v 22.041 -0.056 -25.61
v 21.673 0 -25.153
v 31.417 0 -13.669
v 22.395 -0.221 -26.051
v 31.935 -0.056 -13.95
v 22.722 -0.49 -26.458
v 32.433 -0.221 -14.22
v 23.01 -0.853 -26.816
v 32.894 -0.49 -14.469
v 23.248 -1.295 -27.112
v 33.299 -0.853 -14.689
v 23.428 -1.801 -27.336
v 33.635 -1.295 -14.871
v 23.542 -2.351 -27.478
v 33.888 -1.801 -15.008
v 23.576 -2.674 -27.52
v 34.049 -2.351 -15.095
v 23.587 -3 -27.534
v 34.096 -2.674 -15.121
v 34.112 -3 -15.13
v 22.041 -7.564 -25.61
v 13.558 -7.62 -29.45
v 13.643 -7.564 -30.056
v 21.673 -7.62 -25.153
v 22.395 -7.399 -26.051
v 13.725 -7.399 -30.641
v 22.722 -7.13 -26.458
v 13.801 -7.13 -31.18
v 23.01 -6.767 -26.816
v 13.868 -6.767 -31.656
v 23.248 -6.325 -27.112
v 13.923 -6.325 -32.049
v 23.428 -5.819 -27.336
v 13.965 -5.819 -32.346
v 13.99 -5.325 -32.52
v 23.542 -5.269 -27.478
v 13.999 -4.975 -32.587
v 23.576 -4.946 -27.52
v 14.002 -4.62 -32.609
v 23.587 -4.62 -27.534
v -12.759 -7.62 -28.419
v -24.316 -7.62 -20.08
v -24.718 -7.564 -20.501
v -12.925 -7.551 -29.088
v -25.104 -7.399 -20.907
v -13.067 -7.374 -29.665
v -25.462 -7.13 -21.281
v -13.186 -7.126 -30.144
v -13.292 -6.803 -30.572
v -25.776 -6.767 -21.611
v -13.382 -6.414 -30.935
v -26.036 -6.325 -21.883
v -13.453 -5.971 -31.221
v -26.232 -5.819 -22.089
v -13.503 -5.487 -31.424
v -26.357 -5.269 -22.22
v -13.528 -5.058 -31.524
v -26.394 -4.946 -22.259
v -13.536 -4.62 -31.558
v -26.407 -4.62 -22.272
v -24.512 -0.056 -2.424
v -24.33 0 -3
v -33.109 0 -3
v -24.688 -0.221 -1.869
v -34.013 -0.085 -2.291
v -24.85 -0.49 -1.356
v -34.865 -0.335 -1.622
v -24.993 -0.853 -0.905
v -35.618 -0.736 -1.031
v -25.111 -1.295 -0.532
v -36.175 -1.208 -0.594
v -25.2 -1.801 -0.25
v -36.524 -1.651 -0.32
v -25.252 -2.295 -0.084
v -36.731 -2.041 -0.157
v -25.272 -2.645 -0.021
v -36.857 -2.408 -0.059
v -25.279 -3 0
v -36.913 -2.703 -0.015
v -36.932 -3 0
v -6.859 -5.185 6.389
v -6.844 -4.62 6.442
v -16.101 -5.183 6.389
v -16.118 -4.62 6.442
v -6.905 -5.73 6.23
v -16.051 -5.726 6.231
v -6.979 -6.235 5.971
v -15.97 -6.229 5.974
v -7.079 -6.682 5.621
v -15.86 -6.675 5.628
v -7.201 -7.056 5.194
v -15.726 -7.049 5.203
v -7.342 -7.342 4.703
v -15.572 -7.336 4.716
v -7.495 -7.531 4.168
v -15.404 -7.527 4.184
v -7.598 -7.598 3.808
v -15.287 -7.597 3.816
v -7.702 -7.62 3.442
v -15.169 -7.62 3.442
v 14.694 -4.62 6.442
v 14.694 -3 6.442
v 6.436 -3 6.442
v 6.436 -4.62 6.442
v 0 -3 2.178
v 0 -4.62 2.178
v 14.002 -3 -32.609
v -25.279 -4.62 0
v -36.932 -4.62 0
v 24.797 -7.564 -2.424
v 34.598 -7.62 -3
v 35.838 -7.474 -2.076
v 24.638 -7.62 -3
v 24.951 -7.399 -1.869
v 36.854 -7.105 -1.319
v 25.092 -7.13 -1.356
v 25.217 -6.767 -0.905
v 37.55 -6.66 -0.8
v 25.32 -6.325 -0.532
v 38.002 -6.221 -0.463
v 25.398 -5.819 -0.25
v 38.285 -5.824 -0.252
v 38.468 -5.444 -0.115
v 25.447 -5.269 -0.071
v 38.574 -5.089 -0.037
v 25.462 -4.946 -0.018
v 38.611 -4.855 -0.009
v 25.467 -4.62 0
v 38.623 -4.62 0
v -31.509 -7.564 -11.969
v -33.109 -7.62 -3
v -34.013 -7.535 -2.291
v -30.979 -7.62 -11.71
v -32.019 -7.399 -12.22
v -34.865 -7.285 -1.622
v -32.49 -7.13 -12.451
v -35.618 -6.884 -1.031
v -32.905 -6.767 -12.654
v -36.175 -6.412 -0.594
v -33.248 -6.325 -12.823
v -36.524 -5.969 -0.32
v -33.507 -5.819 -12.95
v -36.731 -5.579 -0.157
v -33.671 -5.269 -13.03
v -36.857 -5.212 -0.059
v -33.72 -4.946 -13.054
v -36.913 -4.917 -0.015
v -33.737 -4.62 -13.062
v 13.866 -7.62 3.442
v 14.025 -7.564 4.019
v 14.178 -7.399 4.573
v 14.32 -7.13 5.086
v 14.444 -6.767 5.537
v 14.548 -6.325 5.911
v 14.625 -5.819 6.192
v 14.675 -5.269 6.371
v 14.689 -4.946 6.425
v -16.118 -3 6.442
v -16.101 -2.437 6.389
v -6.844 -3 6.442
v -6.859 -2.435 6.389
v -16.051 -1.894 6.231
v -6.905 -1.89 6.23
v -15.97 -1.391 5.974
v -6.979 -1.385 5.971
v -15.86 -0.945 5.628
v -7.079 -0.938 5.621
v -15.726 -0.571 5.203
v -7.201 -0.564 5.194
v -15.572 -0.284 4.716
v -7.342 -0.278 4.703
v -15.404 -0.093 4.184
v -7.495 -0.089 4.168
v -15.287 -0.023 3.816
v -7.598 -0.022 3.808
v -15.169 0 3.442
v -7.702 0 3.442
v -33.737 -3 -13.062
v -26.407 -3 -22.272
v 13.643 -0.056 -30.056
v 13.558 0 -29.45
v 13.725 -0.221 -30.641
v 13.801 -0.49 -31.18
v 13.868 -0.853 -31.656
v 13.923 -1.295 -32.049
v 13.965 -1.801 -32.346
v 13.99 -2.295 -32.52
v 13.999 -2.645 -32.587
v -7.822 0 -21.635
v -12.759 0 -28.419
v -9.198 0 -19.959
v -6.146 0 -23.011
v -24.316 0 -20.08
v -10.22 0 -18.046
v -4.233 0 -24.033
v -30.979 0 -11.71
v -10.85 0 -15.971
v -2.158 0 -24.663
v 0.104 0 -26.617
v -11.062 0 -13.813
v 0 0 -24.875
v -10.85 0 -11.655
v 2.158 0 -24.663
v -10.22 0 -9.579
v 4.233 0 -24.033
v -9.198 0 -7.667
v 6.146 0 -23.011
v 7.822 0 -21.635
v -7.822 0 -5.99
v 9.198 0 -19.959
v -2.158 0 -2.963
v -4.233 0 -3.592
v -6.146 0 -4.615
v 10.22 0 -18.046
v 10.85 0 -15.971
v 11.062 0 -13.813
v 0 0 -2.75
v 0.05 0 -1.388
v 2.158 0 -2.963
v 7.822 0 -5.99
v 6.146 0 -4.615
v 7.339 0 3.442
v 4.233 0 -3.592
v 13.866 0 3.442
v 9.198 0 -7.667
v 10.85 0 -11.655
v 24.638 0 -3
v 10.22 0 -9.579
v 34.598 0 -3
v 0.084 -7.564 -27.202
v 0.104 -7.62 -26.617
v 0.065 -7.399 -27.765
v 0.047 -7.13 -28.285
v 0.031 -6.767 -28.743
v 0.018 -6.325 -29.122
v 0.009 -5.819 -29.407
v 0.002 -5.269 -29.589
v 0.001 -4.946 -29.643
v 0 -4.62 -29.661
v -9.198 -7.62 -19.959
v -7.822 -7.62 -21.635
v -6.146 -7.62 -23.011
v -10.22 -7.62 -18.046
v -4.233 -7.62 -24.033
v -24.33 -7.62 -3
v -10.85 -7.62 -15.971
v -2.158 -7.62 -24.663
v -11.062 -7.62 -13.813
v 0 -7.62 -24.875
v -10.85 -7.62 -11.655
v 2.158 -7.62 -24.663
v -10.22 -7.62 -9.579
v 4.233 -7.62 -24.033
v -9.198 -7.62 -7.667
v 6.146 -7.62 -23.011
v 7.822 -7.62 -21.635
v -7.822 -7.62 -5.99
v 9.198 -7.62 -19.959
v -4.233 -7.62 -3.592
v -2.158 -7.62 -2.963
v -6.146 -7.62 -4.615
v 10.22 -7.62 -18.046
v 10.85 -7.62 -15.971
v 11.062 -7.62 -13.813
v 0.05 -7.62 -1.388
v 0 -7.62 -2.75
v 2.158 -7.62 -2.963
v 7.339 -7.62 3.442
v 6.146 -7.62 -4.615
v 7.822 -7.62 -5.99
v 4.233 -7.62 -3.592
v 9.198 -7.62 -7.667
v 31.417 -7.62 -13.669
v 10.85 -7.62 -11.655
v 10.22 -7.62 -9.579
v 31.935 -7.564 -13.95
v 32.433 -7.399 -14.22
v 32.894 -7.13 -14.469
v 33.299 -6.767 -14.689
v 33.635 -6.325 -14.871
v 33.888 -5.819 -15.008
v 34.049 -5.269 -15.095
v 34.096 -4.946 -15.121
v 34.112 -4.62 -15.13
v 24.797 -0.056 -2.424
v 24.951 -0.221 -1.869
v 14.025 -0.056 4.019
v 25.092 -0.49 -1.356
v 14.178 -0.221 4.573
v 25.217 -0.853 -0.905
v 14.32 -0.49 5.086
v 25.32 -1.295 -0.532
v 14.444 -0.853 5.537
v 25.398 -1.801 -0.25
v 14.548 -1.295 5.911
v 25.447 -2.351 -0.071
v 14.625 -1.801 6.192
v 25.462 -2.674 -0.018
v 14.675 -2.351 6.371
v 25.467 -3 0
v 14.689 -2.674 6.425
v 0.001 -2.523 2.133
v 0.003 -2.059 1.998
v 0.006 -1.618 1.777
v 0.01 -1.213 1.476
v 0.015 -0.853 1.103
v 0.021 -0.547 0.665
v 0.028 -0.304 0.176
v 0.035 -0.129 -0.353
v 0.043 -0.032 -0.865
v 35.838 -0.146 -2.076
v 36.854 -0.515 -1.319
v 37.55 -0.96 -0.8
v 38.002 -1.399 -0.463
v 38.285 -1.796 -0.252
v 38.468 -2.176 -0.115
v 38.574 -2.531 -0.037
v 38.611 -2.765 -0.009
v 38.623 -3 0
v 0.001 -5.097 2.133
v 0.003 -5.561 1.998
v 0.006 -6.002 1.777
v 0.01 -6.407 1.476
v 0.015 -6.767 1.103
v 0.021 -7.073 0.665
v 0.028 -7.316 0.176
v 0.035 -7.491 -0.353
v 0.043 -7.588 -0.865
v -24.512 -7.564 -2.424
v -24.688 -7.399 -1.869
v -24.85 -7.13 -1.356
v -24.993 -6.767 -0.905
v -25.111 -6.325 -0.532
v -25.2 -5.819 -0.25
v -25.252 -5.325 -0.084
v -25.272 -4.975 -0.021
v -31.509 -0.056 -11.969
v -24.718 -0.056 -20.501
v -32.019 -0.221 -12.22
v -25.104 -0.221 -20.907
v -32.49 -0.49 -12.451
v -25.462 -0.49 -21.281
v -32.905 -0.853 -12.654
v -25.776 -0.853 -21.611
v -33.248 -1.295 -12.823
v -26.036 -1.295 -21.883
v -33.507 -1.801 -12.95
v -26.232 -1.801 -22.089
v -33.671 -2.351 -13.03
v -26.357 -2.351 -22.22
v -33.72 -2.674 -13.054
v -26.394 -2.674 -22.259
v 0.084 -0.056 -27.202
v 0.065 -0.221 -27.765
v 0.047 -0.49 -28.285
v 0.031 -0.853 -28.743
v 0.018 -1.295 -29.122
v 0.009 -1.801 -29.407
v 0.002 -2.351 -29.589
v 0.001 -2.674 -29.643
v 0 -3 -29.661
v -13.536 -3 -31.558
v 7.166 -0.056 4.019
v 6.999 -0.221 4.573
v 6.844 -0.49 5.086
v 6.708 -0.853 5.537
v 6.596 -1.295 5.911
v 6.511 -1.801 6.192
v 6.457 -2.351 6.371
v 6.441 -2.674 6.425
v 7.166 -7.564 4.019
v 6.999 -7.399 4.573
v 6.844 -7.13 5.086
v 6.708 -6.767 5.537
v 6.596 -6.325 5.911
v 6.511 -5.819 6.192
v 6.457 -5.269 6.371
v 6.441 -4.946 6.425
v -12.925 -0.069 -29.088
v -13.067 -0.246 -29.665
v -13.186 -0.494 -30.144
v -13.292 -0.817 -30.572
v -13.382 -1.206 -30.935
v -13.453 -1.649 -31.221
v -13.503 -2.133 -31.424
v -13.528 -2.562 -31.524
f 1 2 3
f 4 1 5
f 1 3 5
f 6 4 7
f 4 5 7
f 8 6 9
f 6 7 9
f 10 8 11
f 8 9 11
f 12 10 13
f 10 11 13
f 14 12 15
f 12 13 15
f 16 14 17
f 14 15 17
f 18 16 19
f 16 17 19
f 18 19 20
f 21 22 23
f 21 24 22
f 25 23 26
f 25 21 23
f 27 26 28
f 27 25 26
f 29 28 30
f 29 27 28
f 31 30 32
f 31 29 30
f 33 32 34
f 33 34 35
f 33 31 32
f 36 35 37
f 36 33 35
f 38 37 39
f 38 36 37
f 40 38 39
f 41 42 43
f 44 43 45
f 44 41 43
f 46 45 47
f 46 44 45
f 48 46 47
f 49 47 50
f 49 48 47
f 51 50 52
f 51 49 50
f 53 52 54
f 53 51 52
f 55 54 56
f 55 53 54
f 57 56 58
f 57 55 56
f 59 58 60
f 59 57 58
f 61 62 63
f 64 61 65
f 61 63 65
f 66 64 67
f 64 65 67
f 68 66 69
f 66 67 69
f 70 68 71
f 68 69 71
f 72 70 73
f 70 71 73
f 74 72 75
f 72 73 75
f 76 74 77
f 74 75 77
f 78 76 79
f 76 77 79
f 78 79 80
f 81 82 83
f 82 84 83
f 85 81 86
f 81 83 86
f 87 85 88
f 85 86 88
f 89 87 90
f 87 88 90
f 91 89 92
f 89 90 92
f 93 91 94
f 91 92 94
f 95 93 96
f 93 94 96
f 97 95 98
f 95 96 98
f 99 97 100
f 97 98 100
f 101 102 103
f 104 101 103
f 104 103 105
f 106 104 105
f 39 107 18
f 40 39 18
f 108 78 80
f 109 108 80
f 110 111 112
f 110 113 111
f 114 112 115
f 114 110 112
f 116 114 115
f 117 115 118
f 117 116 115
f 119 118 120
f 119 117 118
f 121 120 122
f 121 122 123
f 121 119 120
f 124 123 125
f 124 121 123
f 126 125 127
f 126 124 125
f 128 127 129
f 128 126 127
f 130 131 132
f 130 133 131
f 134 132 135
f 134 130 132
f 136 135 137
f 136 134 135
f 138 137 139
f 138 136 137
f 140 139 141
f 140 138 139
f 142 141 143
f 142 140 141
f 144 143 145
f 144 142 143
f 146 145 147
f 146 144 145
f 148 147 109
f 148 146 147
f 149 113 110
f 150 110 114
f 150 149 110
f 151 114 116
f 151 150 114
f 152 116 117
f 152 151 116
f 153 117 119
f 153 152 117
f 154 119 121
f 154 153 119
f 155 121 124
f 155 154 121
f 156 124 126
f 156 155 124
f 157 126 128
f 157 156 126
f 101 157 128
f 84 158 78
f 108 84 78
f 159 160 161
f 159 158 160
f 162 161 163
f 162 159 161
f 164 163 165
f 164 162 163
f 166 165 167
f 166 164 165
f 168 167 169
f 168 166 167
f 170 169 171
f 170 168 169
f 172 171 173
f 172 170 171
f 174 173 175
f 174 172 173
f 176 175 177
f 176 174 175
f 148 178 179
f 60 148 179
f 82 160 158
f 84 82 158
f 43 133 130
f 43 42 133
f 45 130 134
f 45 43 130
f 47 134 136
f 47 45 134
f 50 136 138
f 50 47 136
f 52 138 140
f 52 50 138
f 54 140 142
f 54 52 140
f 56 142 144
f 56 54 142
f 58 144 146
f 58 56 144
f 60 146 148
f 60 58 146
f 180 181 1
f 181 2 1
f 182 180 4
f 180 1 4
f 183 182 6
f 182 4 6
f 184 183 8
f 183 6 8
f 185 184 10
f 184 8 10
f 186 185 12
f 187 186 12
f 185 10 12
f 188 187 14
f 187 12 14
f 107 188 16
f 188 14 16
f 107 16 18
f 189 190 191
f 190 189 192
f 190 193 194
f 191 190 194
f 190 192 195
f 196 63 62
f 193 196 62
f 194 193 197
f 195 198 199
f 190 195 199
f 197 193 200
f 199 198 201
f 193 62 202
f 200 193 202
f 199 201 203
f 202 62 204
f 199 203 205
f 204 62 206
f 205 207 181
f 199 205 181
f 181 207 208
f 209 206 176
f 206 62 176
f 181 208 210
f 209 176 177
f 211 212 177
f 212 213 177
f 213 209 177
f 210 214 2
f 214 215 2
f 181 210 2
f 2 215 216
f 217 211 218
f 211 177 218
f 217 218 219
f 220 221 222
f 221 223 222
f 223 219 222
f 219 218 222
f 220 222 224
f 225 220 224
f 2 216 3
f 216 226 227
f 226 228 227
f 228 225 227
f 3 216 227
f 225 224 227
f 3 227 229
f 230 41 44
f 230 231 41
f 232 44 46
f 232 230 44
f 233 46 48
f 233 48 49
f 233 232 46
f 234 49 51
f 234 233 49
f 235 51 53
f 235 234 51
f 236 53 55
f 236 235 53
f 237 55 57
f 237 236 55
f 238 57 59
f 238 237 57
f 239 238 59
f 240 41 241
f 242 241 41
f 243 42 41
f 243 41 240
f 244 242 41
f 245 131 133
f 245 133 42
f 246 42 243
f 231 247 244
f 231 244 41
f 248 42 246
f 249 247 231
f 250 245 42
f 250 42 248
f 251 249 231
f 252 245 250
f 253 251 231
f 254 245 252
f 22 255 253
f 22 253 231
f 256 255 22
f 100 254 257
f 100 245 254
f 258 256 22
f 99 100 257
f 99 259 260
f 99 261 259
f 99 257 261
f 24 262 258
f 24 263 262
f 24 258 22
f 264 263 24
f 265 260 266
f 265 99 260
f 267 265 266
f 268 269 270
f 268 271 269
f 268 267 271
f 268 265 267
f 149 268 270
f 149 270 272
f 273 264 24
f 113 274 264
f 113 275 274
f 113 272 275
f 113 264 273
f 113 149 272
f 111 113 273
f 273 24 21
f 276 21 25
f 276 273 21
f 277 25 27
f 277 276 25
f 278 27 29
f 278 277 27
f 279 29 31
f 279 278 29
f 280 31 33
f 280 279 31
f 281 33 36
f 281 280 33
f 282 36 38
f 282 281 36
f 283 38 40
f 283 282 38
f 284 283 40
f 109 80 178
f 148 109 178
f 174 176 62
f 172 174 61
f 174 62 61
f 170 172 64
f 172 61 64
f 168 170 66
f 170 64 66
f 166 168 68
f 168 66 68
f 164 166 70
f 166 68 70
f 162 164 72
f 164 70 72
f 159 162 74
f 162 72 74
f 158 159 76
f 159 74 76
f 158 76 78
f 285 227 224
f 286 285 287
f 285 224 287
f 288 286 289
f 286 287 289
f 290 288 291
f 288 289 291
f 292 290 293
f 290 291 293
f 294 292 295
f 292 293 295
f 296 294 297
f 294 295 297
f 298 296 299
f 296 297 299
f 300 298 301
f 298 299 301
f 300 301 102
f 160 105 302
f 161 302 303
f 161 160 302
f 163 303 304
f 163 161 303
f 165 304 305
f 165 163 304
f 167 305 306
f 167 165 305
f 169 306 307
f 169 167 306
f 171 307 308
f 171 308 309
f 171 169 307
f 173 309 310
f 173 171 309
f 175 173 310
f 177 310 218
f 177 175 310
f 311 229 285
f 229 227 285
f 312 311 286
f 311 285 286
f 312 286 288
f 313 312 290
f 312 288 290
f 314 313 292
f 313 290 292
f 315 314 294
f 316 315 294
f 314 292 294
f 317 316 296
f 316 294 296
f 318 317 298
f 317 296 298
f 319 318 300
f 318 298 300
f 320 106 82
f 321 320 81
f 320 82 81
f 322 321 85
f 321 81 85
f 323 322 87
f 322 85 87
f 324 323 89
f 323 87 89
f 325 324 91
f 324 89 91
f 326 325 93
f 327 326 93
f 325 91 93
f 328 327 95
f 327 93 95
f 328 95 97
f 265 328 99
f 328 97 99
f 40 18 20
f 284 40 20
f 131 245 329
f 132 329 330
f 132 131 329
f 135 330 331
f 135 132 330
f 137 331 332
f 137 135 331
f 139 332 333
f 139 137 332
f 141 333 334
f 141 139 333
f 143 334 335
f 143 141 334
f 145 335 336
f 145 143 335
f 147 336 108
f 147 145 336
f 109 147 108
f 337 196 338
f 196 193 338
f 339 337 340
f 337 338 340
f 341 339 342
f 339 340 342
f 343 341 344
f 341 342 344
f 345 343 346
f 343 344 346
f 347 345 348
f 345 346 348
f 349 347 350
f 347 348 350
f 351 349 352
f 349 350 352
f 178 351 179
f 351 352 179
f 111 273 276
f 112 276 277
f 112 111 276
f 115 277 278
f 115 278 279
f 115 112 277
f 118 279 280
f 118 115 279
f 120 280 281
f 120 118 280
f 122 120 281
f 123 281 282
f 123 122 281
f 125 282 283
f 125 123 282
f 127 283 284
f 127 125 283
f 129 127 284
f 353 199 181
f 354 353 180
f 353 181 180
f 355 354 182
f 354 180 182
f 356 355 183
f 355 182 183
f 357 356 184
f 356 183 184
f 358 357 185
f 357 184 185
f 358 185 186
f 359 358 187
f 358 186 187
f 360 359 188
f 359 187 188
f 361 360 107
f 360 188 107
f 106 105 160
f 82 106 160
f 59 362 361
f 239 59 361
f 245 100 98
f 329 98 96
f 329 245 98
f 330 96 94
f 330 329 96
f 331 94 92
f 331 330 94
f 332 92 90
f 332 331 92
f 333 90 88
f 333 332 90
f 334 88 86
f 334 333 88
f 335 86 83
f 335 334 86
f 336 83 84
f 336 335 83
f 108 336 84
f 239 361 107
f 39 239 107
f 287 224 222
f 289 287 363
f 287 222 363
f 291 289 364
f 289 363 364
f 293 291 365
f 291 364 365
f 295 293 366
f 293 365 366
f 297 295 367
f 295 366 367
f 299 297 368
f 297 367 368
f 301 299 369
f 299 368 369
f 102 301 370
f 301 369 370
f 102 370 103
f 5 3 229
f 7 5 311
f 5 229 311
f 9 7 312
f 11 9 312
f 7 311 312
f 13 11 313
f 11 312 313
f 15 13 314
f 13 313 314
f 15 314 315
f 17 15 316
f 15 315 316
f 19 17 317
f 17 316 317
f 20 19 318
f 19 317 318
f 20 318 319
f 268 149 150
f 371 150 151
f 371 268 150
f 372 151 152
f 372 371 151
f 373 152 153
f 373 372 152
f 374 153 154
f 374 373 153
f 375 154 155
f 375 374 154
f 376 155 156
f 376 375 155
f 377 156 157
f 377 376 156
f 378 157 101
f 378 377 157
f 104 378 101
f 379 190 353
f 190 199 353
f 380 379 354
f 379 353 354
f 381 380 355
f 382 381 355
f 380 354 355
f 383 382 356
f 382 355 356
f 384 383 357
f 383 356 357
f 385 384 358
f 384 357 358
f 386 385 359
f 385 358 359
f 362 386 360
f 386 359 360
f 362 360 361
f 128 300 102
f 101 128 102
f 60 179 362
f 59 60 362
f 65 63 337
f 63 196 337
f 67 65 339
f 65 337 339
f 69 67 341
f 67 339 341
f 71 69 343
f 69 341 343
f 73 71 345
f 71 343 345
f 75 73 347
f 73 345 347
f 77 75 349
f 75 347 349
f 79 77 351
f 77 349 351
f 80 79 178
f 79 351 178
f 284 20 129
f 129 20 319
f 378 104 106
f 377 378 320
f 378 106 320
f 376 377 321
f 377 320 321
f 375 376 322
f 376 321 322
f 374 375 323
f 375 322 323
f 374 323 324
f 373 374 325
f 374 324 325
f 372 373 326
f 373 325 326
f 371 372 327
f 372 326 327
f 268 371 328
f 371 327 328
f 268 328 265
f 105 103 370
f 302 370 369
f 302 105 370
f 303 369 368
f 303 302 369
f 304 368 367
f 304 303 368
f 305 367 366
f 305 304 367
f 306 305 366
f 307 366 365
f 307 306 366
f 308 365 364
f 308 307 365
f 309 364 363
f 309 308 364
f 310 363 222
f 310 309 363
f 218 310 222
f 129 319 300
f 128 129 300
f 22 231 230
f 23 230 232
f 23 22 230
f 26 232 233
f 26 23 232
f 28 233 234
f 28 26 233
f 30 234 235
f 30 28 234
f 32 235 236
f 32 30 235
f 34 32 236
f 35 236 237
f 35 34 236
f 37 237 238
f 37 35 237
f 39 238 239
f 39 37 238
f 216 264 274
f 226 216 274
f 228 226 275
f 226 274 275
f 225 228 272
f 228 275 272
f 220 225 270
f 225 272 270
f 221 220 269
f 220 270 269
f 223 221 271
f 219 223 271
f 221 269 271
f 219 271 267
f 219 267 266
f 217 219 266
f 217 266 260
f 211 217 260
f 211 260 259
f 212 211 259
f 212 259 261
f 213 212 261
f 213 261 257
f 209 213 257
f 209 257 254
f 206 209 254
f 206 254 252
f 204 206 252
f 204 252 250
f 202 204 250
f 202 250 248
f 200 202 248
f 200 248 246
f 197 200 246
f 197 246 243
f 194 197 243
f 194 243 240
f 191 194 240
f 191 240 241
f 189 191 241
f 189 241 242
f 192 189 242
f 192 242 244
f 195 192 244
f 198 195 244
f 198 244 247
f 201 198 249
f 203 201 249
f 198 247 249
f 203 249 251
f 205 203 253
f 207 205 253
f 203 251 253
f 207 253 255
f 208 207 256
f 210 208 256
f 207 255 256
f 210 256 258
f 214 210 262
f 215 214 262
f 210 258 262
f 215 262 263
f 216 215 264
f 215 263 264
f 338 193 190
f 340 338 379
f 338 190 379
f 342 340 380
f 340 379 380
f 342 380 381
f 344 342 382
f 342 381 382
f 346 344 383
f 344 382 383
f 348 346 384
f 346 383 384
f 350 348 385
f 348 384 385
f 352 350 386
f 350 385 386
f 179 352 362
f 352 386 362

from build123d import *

# Parameters (mm, degrees)
F1_DEPTH = 7.62
F2_R     = 11.0625
F3_DEPTH = 10
F4_R     = 3


with BuildPart() as f1:
    # F0 (on Front) → F1 (new body)
    with BuildSketch(Plane.XZ):
        Polygon((0, 2.178027), (-6.844124, 6.442403), (-16.118215, 6.442403), (-25.278939, 0), (-36.931682, 0), (-33.736575, -13.062352), (-26.406623, -22.271778), (-13.536484, -31.557597), (0, -29.661065), (14.002089, -32.608893), (23.587411, -27.53431), (34.112468, -15.129773), (38.62321, 0), (25.466887, 0), (14.694345, 6.442403), (6.435679, 6.442403), align=None)
    extrude(amount=F1_DEPTH)

    # F2 (on face) → F3 (cut)
    with BuildSketch(Plane.XZ.offset(7.62)):
        with Locations((0, -13.812818)):
            Circle(F2_R)
    extrude(amount=-F3_DEPTH, mode=Mode.SUBTRACT)

    # F4
    f4_edges = [f1.edges().sort_by_distance(p)[0] for p in [
        (-35.334129, -7.62, -6.531176),
        (-30.071599, -7.62, -17.667065),
        (-19.971554, -7.62, -26.914688),
        (-6.768242, -7.62, -30.609331),
        (7.001045, -7.62, -31.134979),
        (18.79475, -7.62, -30.071601),
        (28.84994, -7.62, -21.332041),
        (36.367839, -7.62, -7.564886),
        (32.045049, -7.62, 0),
        (20.080616, -7.62, 3.221201),
        (10.565012, -7.62, 6.442403),
        (3.21784, -7.62, 4.310215),
        (-3.422062, -7.62, 4.310215),
        (-11.481169, -7.62, 6.442403),
        (-20.698577, -7.62, 3.221201),
        (-31.105311, -7.62, 0),
        (-31.105311, 0, 0),
        (-35.334129, 0, -6.531176),
        (-30.071599, 0, -17.667065),
        (-19.971554, 0, -26.914688),
        (-6.768242, 0, -30.609331),
        (7.001045, 0, -31.134979),
        (18.79475, 0, -30.071601),
        (28.84994, 0, -21.332041),
        (36.367839, 0, -7.564886),
        (32.045049, 0, 0),
        (20.080616, 0, 3.221201),
        (10.565012, 0, 6.442403),
        (3.21784, 0, 4.310215),
        (-3.422062, 0, 4.310215),
        (-11.481169, 0, 6.442403),
        (-20.698577, 0, 3.221201),
    ]]
    fillet(f4_edges, radius=F4_R)


solid = f1.part
